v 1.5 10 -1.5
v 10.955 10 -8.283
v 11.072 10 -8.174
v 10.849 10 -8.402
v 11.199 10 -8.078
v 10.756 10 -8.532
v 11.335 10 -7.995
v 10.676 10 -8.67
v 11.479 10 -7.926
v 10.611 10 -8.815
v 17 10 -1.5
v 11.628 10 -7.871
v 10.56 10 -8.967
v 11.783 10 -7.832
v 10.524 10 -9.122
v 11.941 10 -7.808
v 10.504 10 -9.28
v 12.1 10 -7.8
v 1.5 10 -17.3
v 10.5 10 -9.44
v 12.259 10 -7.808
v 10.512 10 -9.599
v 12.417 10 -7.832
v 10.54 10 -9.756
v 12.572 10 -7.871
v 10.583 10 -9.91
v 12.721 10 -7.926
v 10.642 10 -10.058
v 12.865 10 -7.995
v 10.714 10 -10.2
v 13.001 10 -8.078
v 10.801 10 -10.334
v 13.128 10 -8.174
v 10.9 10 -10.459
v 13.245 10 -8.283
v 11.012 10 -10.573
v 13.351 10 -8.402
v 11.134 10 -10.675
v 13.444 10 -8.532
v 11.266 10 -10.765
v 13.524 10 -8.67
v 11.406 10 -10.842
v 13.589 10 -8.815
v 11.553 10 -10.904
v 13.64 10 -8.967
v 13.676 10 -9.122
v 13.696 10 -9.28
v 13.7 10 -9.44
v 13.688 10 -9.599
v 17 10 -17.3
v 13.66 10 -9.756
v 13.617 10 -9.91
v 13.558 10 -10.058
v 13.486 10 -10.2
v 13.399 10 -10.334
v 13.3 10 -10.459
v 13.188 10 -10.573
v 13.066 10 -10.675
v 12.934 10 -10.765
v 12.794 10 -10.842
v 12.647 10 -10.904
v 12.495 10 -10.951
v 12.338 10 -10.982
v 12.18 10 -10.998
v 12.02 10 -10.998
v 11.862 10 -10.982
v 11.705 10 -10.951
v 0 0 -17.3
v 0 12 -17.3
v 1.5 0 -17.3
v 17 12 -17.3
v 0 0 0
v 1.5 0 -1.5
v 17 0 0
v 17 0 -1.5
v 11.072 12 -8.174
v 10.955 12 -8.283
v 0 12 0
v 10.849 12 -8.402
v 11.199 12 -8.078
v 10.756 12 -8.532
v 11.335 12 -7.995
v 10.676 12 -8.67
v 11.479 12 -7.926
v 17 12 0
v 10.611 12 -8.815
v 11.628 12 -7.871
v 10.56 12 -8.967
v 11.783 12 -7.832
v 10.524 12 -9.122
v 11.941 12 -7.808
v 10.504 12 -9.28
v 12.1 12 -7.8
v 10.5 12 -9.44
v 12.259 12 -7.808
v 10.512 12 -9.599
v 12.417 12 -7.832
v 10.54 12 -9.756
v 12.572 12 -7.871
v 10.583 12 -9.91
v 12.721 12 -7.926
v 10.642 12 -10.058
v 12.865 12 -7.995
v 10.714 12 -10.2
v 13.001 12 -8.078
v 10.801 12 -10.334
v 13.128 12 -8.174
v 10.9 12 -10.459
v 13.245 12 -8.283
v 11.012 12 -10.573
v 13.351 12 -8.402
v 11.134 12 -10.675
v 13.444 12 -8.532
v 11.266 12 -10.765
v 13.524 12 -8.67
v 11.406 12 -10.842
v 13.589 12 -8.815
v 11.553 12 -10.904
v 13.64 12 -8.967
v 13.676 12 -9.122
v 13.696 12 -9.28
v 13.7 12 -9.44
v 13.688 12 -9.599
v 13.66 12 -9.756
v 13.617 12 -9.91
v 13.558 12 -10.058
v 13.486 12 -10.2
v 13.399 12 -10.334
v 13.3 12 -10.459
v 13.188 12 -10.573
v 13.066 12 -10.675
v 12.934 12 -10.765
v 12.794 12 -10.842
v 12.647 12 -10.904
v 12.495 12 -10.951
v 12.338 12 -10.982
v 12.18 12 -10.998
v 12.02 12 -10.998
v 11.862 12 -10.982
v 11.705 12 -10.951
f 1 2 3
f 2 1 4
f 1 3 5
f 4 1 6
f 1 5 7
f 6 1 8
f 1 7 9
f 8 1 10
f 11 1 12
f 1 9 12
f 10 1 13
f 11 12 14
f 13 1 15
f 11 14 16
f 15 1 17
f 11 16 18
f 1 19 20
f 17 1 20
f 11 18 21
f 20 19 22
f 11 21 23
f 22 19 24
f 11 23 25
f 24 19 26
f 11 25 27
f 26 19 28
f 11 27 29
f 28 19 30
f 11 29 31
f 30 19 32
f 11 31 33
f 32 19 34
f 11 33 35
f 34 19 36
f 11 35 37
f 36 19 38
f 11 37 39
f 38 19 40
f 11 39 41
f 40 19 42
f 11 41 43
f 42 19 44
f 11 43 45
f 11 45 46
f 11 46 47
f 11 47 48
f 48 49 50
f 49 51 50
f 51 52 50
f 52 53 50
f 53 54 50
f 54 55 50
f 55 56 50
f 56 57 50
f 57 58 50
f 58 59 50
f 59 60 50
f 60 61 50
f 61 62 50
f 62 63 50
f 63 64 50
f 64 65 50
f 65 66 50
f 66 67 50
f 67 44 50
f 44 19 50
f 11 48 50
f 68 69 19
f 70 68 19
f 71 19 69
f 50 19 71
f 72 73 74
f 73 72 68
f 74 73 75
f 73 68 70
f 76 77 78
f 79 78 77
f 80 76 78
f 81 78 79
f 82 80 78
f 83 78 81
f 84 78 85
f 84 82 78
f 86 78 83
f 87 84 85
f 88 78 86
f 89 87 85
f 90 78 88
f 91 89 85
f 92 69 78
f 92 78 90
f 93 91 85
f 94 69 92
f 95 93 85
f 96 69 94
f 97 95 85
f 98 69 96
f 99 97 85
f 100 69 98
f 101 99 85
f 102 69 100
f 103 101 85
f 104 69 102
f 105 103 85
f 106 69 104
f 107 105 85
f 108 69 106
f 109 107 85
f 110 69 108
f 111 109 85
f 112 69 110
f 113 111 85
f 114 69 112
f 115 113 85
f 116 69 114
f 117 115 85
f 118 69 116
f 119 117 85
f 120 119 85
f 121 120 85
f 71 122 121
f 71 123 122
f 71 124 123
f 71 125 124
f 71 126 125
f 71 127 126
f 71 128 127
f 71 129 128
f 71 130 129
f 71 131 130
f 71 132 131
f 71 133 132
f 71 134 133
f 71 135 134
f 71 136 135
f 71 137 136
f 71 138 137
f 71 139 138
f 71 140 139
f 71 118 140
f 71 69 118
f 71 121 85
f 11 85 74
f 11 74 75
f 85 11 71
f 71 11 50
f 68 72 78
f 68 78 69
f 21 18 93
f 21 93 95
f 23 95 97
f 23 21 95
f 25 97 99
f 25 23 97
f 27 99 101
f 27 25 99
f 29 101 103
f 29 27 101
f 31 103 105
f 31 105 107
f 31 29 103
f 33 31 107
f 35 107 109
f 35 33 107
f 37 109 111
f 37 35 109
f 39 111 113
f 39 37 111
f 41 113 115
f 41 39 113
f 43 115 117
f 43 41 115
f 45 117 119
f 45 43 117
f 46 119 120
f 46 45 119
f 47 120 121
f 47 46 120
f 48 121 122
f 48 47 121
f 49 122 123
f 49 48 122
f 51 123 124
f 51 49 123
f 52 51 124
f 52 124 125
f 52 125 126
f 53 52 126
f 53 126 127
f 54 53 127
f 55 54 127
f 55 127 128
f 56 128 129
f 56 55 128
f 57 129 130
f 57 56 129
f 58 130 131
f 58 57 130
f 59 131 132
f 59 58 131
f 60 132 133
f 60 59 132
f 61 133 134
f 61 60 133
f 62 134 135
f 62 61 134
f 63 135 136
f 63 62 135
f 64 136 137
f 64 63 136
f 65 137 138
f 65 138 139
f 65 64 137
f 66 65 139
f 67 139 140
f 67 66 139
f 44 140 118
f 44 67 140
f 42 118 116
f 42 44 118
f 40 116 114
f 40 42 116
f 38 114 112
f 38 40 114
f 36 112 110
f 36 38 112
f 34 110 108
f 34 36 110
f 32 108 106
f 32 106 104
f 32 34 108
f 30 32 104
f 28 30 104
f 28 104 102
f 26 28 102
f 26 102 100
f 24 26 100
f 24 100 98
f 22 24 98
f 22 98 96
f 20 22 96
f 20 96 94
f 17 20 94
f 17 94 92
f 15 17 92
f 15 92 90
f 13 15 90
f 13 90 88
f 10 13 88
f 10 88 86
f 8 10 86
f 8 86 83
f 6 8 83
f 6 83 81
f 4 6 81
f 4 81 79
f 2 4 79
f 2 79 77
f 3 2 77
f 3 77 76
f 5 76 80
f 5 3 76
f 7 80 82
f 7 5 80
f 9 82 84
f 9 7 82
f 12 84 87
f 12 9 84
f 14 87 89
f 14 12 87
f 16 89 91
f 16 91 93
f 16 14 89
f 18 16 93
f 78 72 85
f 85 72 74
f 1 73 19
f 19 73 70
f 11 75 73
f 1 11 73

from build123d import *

# Parameters (mm, degrees)
EXTRUDE_1_DEPTH     = 10
SKETCH_2_W          = 17
SKETCH_2_H          = 18.8
SKETCH_2_R          = 1.6
EXTRUDE_2_DEPTH     = 2
SKETCH_4_W          = 17
SKETCH_4_H          = 1.5
CUT_EXTRUDE_1_DEPTH = 29.04353758


with BuildPart() as part:
    # 草图1 → 凸台-拉伸1 (new body)
    with BuildSketch(Plane(origin=(0, 0, 0), x_dir=(1, 0, 0), z_dir=(0, 1, 0))):
        Polygon((1.5, 1.5), (1.5, 17.3), (15.5, 17.3), (17, 17.3), (17, 18.8), (0, 18.8), (0, 0), (17, 0), (17, 1.5), (15.5, 1.5), align=None)
    extrude(amount=EXTRUDE_1_DEPTH)

    # 草图2 → 凸台-拉伸2 (add)
    with BuildSketch(Plane(origin=(0, 10, 0), x_dir=(1, 0, 0), z_dir=(0, 1, 0))):
        with Locations((8.5, 9.4)):
            Rectangle(SKETCH_2_W, SKETCH_2_H)
        with Locations(Location((12.1, 9.4, 0), (0, 0, 270))):
            Circle(SKETCH_2_R, mode=Mode.SUBTRACT)
    extrude(amount=EXTRUDE_2_DEPTH)

    # 草图4 → 切除-拉伸1 (cut, through all)
    with BuildSketch(Plane.XZ):
        with Locations((8.5, -18.05)):
            Rectangle(SKETCH_4_W, SKETCH_4_H)
    extrude(amount=-CUT_EXTRUDE_1_DEPTH, mode=Mode.SUBTRACT)


solid = part.part
